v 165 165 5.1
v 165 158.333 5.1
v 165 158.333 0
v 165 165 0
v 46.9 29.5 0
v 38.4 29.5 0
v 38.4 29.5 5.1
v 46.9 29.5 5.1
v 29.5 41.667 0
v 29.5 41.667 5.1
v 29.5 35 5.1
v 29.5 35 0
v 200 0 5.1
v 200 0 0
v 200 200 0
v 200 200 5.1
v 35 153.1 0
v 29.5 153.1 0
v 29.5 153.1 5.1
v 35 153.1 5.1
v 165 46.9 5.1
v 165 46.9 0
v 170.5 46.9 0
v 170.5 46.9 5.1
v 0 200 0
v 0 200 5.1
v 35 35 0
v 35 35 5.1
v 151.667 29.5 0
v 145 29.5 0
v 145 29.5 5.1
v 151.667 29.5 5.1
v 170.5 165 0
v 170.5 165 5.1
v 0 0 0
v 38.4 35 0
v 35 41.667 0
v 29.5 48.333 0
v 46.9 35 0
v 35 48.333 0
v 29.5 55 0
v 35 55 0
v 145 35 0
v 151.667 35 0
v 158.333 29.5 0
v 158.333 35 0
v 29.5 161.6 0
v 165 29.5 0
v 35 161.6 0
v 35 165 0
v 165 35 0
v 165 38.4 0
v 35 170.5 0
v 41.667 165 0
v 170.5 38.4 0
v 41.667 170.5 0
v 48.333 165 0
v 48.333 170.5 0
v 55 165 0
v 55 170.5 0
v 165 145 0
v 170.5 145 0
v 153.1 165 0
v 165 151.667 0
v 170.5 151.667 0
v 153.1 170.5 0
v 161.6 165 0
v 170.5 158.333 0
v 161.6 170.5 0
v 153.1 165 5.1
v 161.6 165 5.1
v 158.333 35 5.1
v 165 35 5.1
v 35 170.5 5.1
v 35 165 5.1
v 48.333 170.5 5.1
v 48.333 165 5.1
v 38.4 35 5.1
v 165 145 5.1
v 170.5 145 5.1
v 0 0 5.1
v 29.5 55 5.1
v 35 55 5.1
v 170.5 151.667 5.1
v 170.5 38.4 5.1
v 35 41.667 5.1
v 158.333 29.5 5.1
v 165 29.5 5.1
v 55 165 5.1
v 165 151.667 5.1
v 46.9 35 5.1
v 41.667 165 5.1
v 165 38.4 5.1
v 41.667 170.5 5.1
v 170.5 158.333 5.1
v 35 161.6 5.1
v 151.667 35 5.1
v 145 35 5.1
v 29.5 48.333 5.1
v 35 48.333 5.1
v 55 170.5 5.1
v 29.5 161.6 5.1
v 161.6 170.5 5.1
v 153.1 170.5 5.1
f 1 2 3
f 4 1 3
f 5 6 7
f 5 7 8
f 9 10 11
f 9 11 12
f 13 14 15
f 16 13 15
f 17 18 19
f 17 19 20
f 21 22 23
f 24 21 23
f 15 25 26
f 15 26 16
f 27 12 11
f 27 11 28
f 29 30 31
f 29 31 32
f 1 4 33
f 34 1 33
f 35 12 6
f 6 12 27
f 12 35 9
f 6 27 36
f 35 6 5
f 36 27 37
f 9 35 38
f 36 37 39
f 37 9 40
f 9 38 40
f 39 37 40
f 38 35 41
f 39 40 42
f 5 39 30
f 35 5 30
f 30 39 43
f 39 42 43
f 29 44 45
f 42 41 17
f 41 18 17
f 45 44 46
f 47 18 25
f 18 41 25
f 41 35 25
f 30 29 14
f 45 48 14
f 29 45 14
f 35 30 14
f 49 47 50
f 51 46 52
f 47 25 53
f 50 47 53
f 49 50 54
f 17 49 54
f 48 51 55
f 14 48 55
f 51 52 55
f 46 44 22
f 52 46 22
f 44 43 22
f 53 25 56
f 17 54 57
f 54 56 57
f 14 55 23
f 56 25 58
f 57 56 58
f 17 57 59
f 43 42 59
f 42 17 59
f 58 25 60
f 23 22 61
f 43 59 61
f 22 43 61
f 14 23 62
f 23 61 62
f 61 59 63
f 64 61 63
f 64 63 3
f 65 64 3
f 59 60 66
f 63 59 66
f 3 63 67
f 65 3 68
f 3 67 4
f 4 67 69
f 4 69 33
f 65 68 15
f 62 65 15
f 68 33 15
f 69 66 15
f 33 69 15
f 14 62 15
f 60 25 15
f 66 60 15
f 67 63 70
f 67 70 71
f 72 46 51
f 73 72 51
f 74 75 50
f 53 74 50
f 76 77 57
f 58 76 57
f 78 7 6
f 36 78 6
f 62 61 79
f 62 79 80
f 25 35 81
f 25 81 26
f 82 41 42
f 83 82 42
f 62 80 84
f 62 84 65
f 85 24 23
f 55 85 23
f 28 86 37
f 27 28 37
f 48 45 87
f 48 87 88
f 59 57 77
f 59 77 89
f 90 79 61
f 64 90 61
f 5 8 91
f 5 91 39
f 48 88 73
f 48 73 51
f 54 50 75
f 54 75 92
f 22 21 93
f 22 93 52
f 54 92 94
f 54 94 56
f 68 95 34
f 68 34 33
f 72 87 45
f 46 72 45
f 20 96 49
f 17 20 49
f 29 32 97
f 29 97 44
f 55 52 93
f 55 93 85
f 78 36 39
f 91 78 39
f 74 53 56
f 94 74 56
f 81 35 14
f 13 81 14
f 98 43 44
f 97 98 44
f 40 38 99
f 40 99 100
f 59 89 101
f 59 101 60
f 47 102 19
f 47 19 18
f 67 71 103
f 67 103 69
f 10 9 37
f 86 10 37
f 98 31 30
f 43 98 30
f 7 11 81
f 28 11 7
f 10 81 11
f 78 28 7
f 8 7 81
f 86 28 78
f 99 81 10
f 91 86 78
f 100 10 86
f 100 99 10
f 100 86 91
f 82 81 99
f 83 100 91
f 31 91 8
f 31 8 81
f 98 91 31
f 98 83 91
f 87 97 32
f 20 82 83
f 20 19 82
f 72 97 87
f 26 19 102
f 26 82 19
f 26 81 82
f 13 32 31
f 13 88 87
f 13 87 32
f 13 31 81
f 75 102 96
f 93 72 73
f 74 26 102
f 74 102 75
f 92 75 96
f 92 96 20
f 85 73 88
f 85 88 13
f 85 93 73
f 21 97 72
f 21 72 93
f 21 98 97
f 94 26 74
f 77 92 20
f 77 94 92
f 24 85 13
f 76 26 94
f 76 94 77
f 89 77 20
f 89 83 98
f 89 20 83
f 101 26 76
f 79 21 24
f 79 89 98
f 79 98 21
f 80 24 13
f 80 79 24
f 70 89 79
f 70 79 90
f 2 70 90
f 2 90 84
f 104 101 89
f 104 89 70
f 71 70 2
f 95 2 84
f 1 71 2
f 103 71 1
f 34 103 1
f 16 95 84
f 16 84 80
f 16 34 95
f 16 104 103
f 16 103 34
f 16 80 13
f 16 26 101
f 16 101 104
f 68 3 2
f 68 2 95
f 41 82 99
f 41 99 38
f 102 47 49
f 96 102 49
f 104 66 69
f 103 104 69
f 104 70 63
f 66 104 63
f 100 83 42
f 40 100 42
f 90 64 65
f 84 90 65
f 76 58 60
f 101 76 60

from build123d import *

# Parameters (mm, degrees)
SKETCH1_W             = 200
SKETCH1_H             = 200
BOSS_EXTRUDE1_DEPTH   = 5.1
CAVITY1_START         = 29.5
CAVITY1_OUTLINE_W     = 6.666666667
CAVITY1_OUTLINE_H     = 5.1
CAVITY1_OUTLINE_W_2   = 8.5
CAVITY1_DEPTH         = 5.5
CAVITY1_START_2       = 165
CAVITY1_2_OUTLINE_W   = 8.5
CAVITY1_2_OUTLINE_H   = 5.1
CAVITY1_2_OUTLINE_W_2 = 6.666666667
CAVITY1_2_DEPTH       = 5.5
CAVITY1_START_3       = 38.4
CAVITY1_3_OUTLINE_W   = 5.5
CAVITY1_3_OUTLINE_H   = 5.1
CAVITY1_3_DEPTH       = 8.5
CAVITY1_START_4       = 153.1
CAVITY1_4_OUTLINE_W   = 5.5
CAVITY1_4_OUTLINE_H   = 5.1
CAVITY1_4_DEPTH       = 8.5
CAVITY1_START_5       = 35
CAVITY1_5_OUTLINE_W   = 5.5
CAVITY1_5_OUTLINE_H   = 5.1
CAVITY1_5_DEPTH       = 6.666666667
CAVITY1_START_6       = 48.333333333
CAVITY1_6_OUTLINE_W   = 5.5
CAVITY1_6_OUTLINE_H   = 5.1
CAVITY1_6_DEPTH       = 6.666666667
CAVITY1_START_7       = 145
CAVITY1_7_OUTLINE_W   = 5.5
CAVITY1_7_OUTLINE_H   = 5.1
CAVITY1_7_DEPTH       = 6.666666667
CAVITY1_START_8       = 158.333333333
CAVITY1_8_OUTLINE_W   = 5.5
CAVITY1_8_OUTLINE_H   = 5.1
CAVITY1_8_DEPTH       = 6.666666667


# Read off the part's stored shape, not the designer's step: Cavity1
with BuildPart() as part:
    # Sketch1 → Boss-Extrude1 (new body)
    with BuildSketch(Plane.XY):
        with Locations((100, 100)):
            Rectangle(SKETCH1_W, SKETCH1_H)
    extrude(amount=BOSS_EXTRUDE1_DEPTH)

    # Cavity1 outline → Cavity1 (cut)
    with BuildSketch(Plane(origin=(0, 0, 0), x_dir=(1, 0, 0), z_dir=(0, 1, 0)).offset(CAVITY1_START)):
        with Locations((161.666666667, -2.55)):
            Rectangle(CAVITY1_OUTLINE_W, CAVITY1_OUTLINE_H)
        with Locations((148.333333334, -2.55)):
            Rectangle(CAVITY1_OUTLINE_W, CAVITY1_OUTLINE_H)
        with Locations((42.65, -2.55)):
            Rectangle(CAVITY1_OUTLINE_W_2, CAVITY1_OUTLINE_H)
    extrude(amount=CAVITY1_DEPTH, mode=Mode.SUBTRACT)

    # Cavity1 2 outline → Cavity1 2 (cut)
    with BuildSketch(Plane(origin=(0, 0, 0), x_dir=(1, 0, 0), z_dir=(0, 1, 0)).offset(CAVITY1_START_2)):
        with Locations((157.35, -2.55)):
            Rectangle(CAVITY1_2_OUTLINE_W, CAVITY1_2_OUTLINE_H)
        with Locations((51.666666667, -2.55)):
            Rectangle(CAVITY1_2_OUTLINE_W_2, CAVITY1_2_OUTLINE_H)
        with Locations((38.333333334, -2.55)):
            Rectangle(CAVITY1_2_OUTLINE_W_2, CAVITY1_2_OUTLINE_H)
    extrude(amount=CAVITY1_2_DEPTH, mode=Mode.SUBTRACT)

    # Cavity1 3 outline → Cavity1 3 (cut)
    with BuildSketch(Plane(origin=(0, 0, 0), x_dir=(1, 0, 0), z_dir=(0, 1, 0)).offset(CAVITY1_START_3)):
        with Locations((167.75, -2.55)):
            Rectangle(CAVITY1_3_OUTLINE_W, CAVITY1_3_OUTLINE_H)
    extrude(amount=CAVITY1_3_DEPTH, mode=Mode.SUBTRACT)

    # Cavity1 4 outline → Cavity1 4 (cut)
    with BuildSketch(Plane(origin=(0, 0, 0), x_dir=(1, 0, 0), z_dir=(0, 1, 0)).offset(CAVITY1_START_4)):
        with Locations((32.25, -2.55)):
            Rectangle(CAVITY1_4_OUTLINE_W, CAVITY1_4_OUTLINE_H)
    extrude(amount=CAVITY1_4_DEPTH, mode=Mode.SUBTRACT)

    # Cavity1 5 outline → Cavity1 5 (cut)
    with BuildSketch(Plane(origin=(0, 0, 0), x_dir=(1, 0, 0), z_dir=(0, 1, 0)).offset(CAVITY1_START_5)):
        with Locations((32.25, -2.55)):
            Rectangle(CAVITY1_5_OUTLINE_W, CAVITY1_5_OUTLINE_H)
    extrude(amount=CAVITY1_5_DEPTH, mode=Mode.SUBTRACT)

    # Cavity1 6 outline → Cavity1 6 (cut)
    with BuildSketch(Plane(origin=(0, 0, 0), x_dir=(1, 0, 0), z_dir=(0, 1, 0)).offset(CAVITY1_START_6)):
        with Locations((32.25, -2.55)):
            Rectangle(CAVITY1_6_OUTLINE_W, CAVITY1_6_OUTLINE_H)
    extrude(amount=CAVITY1_6_DEPTH, mode=Mode.SUBTRACT)

    # Cavity1 7 outline → Cavity1 7 (cut)
    with BuildSketch(Plane(origin=(0, 0, 0), x_dir=(1, 0, 0), z_dir=(0, 1, 0)).offset(CAVITY1_START_7)):
        with Locations((167.75, -2.55)):
            Rectangle(CAVITY1_7_OUTLINE_W, CAVITY1_7_OUTLINE_H)
    extrude(amount=CAVITY1_7_DEPTH, mode=Mode.SUBTRACT)

    # Cavity1 8 outline → Cavity1 8 (cut)
    with BuildSketch(Plane(origin=(0, 0, 0), x_dir=(1, 0, 0), z_dir=(0, 1, 0)).offset(CAVITY1_START_8)):
        with Locations((167.75, -2.55)):
            Rectangle(CAVITY1_8_OUTLINE_W, CAVITY1_8_OUTLINE_H)
    extrude(amount=CAVITY1_8_DEPTH, mode=Mode.SUBTRACT)


solid = part.part
